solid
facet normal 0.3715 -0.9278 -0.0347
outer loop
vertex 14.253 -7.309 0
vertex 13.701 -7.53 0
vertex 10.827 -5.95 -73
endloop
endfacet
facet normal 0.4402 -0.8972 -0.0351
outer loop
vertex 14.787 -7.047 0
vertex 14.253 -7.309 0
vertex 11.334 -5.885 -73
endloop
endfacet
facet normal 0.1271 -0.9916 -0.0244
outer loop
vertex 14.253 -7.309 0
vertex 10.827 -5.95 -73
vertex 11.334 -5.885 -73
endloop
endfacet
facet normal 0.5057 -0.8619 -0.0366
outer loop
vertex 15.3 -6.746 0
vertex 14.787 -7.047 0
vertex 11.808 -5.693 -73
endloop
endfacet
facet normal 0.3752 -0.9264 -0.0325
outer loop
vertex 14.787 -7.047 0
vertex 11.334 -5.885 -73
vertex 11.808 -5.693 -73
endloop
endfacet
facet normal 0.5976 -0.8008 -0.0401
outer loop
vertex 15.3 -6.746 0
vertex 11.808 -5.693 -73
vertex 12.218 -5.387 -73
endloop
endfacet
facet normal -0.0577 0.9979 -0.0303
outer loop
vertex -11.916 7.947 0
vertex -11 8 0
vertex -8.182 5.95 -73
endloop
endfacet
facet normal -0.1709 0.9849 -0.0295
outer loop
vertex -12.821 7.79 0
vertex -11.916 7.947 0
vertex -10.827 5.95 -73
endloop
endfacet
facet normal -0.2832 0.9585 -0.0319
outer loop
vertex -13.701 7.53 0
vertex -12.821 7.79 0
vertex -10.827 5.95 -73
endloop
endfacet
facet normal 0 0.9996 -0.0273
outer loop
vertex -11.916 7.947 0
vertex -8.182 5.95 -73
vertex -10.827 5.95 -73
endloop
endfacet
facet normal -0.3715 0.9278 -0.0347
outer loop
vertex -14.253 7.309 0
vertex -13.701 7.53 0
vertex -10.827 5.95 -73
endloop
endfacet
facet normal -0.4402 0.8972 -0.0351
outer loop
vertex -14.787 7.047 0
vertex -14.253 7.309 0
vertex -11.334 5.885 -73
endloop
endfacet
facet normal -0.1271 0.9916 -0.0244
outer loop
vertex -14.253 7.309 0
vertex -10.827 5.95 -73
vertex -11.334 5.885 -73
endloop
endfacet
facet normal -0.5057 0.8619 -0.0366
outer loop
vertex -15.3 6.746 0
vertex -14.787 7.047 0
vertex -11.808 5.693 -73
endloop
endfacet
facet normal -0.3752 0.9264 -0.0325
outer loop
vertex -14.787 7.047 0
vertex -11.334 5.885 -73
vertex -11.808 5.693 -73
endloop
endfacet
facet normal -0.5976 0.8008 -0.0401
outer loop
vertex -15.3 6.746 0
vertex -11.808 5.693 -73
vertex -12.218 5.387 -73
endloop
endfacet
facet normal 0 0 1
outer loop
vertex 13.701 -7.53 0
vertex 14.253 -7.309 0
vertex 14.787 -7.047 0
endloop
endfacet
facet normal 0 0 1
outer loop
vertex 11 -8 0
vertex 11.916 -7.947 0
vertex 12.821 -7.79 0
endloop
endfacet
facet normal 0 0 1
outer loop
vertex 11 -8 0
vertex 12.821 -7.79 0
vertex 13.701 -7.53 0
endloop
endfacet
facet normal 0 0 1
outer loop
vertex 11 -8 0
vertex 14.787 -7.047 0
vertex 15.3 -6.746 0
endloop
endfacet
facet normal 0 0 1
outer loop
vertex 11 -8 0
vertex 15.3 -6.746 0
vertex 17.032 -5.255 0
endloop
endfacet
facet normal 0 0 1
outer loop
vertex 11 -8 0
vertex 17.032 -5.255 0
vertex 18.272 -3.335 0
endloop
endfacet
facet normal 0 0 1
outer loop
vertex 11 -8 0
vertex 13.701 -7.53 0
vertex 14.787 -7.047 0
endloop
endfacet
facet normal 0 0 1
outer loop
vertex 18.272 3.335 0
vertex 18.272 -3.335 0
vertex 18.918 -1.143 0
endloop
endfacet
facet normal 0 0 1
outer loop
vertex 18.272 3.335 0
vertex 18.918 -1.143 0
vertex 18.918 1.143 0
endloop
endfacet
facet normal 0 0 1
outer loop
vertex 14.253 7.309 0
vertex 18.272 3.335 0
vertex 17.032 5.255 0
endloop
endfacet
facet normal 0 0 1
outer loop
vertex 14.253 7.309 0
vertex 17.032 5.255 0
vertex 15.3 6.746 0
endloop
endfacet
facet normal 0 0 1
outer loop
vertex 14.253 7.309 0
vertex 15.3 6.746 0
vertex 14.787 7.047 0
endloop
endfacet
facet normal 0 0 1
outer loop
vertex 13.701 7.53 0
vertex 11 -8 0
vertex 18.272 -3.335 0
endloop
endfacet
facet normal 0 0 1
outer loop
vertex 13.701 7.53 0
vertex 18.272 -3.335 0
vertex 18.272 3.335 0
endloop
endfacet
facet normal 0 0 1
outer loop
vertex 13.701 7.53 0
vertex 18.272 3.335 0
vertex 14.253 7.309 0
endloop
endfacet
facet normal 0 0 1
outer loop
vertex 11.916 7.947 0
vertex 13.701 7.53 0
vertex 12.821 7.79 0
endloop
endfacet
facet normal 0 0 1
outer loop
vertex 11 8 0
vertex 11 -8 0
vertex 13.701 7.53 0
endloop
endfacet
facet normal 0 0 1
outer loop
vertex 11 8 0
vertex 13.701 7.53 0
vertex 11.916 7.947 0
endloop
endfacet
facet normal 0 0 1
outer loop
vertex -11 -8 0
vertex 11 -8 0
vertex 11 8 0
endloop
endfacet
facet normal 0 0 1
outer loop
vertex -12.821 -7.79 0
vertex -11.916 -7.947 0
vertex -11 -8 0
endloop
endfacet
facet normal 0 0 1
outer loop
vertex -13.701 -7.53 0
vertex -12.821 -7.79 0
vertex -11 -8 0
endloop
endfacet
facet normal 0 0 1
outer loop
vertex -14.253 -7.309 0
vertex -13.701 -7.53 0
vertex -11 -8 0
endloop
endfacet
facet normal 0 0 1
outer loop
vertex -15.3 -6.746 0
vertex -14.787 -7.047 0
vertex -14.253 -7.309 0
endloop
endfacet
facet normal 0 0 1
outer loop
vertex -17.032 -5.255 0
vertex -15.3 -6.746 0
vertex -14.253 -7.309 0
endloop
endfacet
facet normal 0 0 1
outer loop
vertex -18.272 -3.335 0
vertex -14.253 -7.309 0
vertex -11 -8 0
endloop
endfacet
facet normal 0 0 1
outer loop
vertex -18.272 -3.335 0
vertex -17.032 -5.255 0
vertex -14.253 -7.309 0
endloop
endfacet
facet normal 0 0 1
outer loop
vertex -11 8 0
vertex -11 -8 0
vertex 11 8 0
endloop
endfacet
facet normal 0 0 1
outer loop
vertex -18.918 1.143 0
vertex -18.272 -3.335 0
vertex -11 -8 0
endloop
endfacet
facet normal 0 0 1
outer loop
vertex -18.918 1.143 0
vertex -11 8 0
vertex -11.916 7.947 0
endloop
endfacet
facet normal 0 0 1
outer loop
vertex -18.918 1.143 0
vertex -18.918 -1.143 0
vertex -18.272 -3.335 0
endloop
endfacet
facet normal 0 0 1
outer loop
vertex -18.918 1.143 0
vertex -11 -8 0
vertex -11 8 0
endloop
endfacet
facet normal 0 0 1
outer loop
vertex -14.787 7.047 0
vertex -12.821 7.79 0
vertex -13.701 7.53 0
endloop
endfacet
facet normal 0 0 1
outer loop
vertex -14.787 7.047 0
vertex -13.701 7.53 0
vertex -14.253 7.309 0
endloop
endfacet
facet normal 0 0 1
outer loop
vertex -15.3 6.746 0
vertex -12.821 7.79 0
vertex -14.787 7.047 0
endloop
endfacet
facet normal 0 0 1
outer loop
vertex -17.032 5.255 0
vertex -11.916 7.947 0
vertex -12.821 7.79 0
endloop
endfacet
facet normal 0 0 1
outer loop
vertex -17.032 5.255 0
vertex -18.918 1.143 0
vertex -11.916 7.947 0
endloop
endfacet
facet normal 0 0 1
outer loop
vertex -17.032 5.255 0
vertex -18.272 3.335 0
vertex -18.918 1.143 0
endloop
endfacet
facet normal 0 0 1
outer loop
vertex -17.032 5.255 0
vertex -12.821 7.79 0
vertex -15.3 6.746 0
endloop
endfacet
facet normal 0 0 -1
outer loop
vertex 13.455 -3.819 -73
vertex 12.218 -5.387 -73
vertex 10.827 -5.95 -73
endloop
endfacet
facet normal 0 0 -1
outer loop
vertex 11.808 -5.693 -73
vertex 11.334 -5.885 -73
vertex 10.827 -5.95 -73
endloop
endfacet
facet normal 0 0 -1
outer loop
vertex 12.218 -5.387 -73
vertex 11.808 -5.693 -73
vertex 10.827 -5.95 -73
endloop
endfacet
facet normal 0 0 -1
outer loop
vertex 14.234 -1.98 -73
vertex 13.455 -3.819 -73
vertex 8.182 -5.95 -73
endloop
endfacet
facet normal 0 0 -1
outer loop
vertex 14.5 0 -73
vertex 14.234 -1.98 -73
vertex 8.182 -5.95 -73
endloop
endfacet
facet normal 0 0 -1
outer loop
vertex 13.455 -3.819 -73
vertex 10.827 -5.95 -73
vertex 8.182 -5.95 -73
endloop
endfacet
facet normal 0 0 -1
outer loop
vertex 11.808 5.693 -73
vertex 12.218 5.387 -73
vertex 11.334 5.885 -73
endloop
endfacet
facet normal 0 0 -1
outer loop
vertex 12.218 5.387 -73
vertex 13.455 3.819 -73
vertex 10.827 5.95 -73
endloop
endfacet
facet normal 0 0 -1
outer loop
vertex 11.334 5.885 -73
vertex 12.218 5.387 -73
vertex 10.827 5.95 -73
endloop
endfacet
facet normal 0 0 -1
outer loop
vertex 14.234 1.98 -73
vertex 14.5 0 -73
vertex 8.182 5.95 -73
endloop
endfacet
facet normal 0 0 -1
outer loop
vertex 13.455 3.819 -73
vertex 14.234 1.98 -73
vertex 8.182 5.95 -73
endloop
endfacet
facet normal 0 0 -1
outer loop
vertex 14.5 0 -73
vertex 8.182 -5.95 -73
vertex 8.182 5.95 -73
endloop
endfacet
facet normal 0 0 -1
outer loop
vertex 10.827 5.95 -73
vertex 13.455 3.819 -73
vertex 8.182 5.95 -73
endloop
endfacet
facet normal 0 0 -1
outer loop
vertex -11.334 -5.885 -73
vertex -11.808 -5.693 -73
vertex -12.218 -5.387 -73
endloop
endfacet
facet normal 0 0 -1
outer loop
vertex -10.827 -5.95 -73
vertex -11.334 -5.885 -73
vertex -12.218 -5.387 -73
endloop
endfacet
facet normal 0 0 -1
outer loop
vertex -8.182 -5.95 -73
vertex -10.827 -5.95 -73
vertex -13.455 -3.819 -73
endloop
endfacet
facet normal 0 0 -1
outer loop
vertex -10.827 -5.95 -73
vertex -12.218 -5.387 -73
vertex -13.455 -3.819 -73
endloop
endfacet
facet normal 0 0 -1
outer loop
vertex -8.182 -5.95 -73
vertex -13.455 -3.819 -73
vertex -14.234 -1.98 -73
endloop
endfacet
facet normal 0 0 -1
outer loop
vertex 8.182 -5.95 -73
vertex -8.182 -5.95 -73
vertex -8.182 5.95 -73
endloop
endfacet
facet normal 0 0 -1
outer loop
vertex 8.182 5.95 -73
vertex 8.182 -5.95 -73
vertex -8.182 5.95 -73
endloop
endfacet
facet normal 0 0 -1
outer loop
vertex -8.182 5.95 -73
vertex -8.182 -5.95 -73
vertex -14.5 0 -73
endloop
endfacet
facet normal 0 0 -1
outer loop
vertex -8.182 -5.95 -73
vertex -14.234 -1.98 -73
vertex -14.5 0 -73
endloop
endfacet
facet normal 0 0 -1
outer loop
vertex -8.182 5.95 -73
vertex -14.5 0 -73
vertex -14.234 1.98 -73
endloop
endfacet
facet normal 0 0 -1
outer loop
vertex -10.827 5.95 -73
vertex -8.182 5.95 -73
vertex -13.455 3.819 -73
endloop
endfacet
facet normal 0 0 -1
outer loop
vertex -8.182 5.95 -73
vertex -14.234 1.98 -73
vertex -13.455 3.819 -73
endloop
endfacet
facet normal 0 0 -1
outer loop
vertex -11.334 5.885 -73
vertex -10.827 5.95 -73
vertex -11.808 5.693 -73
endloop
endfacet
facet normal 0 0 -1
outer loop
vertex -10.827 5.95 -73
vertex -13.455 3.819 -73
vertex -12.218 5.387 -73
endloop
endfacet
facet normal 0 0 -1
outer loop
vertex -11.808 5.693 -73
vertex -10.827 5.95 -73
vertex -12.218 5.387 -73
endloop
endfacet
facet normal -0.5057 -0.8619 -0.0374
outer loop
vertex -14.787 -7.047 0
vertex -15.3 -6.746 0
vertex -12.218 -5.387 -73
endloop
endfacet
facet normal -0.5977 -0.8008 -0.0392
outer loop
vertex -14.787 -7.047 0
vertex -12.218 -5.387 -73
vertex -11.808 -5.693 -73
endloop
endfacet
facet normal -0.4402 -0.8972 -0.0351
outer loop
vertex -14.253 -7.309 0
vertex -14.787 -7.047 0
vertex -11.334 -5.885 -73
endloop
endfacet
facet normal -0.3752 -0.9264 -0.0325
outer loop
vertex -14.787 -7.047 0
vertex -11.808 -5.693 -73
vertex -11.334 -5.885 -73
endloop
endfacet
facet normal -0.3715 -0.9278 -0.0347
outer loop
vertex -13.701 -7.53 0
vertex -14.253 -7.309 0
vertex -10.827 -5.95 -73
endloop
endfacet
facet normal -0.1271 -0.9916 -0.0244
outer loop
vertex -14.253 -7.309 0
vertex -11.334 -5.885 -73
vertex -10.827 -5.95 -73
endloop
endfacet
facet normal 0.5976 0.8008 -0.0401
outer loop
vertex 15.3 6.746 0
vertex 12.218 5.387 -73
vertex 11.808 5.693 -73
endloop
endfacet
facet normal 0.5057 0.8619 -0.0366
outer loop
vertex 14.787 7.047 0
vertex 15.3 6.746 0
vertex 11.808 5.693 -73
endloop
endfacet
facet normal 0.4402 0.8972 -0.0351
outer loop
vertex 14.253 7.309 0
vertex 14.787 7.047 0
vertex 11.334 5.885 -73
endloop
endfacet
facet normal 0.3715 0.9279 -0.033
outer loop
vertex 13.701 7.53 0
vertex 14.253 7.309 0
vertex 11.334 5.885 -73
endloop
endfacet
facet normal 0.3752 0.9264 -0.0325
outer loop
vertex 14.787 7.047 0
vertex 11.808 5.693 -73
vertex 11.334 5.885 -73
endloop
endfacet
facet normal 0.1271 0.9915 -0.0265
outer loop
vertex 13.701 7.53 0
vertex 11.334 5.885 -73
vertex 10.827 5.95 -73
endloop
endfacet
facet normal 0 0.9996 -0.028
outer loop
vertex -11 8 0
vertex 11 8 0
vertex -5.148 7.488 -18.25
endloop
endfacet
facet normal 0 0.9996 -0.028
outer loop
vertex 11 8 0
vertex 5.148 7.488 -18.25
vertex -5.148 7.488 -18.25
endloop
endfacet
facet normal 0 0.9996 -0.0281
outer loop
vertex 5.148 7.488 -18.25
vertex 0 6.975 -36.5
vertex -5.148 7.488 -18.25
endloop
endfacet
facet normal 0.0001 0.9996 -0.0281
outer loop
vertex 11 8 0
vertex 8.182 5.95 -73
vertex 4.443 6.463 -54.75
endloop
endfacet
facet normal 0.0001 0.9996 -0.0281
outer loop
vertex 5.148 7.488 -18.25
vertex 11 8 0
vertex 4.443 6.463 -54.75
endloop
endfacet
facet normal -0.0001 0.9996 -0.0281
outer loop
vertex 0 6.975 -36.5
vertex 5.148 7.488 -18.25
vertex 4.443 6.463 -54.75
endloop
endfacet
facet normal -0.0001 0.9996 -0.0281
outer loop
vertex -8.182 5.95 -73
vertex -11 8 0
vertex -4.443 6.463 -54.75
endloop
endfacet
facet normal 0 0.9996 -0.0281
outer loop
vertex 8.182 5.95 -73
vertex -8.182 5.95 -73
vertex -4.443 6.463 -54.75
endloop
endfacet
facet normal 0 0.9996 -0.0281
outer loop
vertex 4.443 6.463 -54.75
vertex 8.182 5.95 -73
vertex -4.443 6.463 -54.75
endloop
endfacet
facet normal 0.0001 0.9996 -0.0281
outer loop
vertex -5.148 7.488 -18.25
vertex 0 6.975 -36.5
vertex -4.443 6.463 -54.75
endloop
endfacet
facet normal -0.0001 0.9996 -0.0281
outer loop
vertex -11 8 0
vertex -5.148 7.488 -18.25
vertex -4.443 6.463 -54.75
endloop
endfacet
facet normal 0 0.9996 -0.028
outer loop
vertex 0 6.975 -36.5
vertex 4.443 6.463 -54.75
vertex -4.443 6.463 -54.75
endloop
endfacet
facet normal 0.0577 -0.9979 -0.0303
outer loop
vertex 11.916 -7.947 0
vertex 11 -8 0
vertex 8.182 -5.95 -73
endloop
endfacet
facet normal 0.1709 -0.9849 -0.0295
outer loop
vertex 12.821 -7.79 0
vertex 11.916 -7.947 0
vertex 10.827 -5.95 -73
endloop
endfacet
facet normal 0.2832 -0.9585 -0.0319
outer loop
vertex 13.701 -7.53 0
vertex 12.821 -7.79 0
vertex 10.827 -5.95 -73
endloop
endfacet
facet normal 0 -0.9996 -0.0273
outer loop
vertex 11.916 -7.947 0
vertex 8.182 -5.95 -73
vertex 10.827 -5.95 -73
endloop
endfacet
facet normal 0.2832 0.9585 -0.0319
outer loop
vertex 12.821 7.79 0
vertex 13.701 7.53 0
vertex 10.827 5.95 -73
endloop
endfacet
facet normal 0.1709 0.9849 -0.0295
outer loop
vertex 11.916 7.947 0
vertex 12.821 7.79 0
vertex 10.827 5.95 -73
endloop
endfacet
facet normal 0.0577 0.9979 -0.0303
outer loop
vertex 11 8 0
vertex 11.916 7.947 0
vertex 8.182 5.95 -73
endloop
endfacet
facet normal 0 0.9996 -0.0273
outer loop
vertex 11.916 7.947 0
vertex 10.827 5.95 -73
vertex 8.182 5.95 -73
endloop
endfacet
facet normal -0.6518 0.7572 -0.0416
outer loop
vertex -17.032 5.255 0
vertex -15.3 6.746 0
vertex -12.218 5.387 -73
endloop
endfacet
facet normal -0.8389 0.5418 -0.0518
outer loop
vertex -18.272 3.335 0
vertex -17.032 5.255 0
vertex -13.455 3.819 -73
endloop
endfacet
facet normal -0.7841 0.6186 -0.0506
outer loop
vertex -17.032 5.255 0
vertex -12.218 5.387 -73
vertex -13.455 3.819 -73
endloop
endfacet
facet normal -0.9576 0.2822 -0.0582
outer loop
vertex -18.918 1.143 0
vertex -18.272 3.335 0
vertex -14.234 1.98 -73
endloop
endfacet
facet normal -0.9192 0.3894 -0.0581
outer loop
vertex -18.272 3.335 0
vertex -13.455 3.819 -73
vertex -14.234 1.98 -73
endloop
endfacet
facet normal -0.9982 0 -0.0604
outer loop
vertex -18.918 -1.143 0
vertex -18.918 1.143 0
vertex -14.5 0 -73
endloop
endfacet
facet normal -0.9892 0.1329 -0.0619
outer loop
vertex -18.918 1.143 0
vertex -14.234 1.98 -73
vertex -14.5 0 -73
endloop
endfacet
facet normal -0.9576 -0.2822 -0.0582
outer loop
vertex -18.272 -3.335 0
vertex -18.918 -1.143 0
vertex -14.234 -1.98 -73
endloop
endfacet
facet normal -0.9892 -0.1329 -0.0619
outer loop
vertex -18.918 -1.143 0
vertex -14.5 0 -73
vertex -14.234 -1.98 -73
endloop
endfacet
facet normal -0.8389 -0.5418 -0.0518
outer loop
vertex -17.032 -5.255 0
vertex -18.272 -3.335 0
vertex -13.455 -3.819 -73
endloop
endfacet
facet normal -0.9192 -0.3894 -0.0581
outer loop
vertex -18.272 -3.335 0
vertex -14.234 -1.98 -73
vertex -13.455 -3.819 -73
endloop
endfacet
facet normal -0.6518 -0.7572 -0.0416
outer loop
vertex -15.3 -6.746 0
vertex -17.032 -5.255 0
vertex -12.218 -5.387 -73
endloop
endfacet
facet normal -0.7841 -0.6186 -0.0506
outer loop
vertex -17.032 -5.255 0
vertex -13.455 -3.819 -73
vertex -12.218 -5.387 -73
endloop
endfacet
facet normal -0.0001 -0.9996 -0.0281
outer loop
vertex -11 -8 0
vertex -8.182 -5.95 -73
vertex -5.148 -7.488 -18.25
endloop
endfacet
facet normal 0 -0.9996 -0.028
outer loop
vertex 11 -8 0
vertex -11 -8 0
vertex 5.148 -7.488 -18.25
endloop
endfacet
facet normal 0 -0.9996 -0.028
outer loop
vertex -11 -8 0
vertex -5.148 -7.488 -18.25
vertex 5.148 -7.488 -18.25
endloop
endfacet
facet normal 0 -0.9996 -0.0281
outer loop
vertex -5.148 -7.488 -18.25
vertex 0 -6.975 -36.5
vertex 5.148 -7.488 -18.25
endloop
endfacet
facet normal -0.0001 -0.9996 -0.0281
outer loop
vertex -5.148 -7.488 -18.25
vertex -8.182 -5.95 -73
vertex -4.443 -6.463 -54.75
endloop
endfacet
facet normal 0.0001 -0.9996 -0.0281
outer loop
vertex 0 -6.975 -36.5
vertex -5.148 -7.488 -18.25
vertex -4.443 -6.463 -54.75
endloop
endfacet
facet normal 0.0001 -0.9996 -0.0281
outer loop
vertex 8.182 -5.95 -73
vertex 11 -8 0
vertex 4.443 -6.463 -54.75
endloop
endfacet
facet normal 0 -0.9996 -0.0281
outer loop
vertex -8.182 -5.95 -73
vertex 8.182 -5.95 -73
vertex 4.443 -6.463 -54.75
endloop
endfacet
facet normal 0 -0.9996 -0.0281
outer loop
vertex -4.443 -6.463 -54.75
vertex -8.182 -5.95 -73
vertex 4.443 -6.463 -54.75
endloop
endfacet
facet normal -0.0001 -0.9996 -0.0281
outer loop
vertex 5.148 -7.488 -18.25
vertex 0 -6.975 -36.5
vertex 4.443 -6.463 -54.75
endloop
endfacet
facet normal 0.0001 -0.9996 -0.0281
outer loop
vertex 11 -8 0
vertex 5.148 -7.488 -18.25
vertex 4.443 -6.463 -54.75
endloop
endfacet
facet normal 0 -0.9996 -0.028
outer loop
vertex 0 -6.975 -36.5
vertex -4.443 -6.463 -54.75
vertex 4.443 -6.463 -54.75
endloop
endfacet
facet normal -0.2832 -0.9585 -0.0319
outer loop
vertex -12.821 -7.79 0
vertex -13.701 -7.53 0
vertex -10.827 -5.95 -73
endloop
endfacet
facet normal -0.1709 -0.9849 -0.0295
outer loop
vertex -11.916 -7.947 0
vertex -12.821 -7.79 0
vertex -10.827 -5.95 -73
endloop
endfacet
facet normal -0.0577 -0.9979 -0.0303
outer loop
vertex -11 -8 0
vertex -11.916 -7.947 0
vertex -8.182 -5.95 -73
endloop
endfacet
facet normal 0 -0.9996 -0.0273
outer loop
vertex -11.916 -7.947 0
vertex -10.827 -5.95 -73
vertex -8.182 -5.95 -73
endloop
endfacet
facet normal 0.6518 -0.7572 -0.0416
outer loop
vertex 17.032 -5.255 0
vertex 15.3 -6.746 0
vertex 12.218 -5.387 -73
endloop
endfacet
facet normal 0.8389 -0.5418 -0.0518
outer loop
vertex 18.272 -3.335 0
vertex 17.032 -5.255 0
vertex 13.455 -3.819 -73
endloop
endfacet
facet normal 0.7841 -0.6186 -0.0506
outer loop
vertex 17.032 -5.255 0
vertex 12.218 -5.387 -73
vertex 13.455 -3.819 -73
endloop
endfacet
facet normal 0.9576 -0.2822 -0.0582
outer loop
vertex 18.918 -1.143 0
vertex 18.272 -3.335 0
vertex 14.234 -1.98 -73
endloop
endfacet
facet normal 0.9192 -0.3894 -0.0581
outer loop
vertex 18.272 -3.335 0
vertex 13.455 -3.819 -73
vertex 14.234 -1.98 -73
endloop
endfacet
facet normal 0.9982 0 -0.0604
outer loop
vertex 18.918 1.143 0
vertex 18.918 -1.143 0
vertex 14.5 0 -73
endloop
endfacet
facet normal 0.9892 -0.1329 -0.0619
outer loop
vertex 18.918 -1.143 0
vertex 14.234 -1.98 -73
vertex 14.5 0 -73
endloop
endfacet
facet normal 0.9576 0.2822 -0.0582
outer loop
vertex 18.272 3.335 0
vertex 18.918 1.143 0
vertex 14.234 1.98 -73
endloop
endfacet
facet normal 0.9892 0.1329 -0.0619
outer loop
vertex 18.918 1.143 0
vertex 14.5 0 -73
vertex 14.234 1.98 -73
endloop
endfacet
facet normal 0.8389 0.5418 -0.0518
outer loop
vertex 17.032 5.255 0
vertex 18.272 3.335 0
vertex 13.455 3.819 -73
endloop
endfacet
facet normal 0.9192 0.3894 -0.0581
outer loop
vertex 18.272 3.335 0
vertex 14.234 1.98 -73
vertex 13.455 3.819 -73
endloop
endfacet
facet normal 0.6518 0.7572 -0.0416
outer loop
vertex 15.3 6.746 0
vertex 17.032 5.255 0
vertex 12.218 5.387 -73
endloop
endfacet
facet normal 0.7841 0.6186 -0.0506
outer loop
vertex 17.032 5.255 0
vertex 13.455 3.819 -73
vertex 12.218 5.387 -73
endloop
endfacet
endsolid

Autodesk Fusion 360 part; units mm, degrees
sketch "Sketch1" plane through (0, 0, 0) normal (0, 0, 1) x (1, 0, 0) in component "Component"
  line L0 (-11, -8) -> (11, -8)
  arc A0 (11, -8) -> (11, 8) centre (11, 0) ccw
  line L1 (11, 8) -> (-11, 8)
  arc A1 (-11, 8) -> (-11, -8) centre (-11, 0) ccw
  line L2 (-11, 0) -> (11, 0) construction
  dimension "d1" = 11
  dimension "d2" = 16
ref_plane "WorkPlane1" through (0, 0, -73) normal (0, 0, 1) x (1, 0, 0) in component "Component"
sketch "Sketch2" plane through (0, 0, -73) normal (0, 0, 1) x (1, 0, 0) in component "Component"
  line L0 (-7, -7.5) -> (7, -7.5) construction
  arc A0 (7, -7.5) -> (7, 7.5) centre (7, 0) ccw construction
  line L1 (7, 7.5) -> (-7, 7.5) construction
  arc A1 (-7, 7.5) -> (-7, -7.5) centre (-7, 0) ccw construction
  line L2 (-7, 0) -> (7, 0) construction
  line L3 (-10.8266, 5.9505) -> (10.8266, 5.9505)
  line L4 (-10.8266, -5.9505) -> (10.8266, -5.9505)
  arc A2 (-12.2182, 5.3871) -> (-12.2182, -5.3871) centre (-7, 0) ccw
  arc A3 (12.2182, -5.3871) -> (12.2182, 5.3871) centre (7, 0) ccw
  arc A4 (-10.8266, 5.9505) -> (-12.2182, 5.3871) centre (-10.8266, 3.9505) ccw
  arc A5 (-12.2182, -5.3871) -> (-10.8266, -5.9505) centre (-10.8266, -3.9505) ccw
  arc A6 (10.8266, -5.9505) -> (12.2182, -5.3871) centre (10.8266, -3.9505) ccw
  arc A7 (12.2182, 5.3871) -> (10.8266, 5.9505) centre (10.8266, 3.9505) ccw
  point P0 (0, 0)
  point P1 (-11.5652, 5.9505)
  point P2 (11.5652, 5.9505)
  point P3 (-11.5652, -5.9505)
  point P4 (11.5652, -5.9505)
  dimension "d4" = 7
  dimension "d5" = 15
  dimension "d6" = 23.1304
  dimension "d7" = 23.1304
  dimension "d8" = 2
loft "Loft1" add profiles "Sketch1", "Sketch2" section 1 section 2 in component "Component"
component "Component" placed x (1, 0, 0) y (0, 1, 0) z (0, 0, 1) at (0, 0, 0)
